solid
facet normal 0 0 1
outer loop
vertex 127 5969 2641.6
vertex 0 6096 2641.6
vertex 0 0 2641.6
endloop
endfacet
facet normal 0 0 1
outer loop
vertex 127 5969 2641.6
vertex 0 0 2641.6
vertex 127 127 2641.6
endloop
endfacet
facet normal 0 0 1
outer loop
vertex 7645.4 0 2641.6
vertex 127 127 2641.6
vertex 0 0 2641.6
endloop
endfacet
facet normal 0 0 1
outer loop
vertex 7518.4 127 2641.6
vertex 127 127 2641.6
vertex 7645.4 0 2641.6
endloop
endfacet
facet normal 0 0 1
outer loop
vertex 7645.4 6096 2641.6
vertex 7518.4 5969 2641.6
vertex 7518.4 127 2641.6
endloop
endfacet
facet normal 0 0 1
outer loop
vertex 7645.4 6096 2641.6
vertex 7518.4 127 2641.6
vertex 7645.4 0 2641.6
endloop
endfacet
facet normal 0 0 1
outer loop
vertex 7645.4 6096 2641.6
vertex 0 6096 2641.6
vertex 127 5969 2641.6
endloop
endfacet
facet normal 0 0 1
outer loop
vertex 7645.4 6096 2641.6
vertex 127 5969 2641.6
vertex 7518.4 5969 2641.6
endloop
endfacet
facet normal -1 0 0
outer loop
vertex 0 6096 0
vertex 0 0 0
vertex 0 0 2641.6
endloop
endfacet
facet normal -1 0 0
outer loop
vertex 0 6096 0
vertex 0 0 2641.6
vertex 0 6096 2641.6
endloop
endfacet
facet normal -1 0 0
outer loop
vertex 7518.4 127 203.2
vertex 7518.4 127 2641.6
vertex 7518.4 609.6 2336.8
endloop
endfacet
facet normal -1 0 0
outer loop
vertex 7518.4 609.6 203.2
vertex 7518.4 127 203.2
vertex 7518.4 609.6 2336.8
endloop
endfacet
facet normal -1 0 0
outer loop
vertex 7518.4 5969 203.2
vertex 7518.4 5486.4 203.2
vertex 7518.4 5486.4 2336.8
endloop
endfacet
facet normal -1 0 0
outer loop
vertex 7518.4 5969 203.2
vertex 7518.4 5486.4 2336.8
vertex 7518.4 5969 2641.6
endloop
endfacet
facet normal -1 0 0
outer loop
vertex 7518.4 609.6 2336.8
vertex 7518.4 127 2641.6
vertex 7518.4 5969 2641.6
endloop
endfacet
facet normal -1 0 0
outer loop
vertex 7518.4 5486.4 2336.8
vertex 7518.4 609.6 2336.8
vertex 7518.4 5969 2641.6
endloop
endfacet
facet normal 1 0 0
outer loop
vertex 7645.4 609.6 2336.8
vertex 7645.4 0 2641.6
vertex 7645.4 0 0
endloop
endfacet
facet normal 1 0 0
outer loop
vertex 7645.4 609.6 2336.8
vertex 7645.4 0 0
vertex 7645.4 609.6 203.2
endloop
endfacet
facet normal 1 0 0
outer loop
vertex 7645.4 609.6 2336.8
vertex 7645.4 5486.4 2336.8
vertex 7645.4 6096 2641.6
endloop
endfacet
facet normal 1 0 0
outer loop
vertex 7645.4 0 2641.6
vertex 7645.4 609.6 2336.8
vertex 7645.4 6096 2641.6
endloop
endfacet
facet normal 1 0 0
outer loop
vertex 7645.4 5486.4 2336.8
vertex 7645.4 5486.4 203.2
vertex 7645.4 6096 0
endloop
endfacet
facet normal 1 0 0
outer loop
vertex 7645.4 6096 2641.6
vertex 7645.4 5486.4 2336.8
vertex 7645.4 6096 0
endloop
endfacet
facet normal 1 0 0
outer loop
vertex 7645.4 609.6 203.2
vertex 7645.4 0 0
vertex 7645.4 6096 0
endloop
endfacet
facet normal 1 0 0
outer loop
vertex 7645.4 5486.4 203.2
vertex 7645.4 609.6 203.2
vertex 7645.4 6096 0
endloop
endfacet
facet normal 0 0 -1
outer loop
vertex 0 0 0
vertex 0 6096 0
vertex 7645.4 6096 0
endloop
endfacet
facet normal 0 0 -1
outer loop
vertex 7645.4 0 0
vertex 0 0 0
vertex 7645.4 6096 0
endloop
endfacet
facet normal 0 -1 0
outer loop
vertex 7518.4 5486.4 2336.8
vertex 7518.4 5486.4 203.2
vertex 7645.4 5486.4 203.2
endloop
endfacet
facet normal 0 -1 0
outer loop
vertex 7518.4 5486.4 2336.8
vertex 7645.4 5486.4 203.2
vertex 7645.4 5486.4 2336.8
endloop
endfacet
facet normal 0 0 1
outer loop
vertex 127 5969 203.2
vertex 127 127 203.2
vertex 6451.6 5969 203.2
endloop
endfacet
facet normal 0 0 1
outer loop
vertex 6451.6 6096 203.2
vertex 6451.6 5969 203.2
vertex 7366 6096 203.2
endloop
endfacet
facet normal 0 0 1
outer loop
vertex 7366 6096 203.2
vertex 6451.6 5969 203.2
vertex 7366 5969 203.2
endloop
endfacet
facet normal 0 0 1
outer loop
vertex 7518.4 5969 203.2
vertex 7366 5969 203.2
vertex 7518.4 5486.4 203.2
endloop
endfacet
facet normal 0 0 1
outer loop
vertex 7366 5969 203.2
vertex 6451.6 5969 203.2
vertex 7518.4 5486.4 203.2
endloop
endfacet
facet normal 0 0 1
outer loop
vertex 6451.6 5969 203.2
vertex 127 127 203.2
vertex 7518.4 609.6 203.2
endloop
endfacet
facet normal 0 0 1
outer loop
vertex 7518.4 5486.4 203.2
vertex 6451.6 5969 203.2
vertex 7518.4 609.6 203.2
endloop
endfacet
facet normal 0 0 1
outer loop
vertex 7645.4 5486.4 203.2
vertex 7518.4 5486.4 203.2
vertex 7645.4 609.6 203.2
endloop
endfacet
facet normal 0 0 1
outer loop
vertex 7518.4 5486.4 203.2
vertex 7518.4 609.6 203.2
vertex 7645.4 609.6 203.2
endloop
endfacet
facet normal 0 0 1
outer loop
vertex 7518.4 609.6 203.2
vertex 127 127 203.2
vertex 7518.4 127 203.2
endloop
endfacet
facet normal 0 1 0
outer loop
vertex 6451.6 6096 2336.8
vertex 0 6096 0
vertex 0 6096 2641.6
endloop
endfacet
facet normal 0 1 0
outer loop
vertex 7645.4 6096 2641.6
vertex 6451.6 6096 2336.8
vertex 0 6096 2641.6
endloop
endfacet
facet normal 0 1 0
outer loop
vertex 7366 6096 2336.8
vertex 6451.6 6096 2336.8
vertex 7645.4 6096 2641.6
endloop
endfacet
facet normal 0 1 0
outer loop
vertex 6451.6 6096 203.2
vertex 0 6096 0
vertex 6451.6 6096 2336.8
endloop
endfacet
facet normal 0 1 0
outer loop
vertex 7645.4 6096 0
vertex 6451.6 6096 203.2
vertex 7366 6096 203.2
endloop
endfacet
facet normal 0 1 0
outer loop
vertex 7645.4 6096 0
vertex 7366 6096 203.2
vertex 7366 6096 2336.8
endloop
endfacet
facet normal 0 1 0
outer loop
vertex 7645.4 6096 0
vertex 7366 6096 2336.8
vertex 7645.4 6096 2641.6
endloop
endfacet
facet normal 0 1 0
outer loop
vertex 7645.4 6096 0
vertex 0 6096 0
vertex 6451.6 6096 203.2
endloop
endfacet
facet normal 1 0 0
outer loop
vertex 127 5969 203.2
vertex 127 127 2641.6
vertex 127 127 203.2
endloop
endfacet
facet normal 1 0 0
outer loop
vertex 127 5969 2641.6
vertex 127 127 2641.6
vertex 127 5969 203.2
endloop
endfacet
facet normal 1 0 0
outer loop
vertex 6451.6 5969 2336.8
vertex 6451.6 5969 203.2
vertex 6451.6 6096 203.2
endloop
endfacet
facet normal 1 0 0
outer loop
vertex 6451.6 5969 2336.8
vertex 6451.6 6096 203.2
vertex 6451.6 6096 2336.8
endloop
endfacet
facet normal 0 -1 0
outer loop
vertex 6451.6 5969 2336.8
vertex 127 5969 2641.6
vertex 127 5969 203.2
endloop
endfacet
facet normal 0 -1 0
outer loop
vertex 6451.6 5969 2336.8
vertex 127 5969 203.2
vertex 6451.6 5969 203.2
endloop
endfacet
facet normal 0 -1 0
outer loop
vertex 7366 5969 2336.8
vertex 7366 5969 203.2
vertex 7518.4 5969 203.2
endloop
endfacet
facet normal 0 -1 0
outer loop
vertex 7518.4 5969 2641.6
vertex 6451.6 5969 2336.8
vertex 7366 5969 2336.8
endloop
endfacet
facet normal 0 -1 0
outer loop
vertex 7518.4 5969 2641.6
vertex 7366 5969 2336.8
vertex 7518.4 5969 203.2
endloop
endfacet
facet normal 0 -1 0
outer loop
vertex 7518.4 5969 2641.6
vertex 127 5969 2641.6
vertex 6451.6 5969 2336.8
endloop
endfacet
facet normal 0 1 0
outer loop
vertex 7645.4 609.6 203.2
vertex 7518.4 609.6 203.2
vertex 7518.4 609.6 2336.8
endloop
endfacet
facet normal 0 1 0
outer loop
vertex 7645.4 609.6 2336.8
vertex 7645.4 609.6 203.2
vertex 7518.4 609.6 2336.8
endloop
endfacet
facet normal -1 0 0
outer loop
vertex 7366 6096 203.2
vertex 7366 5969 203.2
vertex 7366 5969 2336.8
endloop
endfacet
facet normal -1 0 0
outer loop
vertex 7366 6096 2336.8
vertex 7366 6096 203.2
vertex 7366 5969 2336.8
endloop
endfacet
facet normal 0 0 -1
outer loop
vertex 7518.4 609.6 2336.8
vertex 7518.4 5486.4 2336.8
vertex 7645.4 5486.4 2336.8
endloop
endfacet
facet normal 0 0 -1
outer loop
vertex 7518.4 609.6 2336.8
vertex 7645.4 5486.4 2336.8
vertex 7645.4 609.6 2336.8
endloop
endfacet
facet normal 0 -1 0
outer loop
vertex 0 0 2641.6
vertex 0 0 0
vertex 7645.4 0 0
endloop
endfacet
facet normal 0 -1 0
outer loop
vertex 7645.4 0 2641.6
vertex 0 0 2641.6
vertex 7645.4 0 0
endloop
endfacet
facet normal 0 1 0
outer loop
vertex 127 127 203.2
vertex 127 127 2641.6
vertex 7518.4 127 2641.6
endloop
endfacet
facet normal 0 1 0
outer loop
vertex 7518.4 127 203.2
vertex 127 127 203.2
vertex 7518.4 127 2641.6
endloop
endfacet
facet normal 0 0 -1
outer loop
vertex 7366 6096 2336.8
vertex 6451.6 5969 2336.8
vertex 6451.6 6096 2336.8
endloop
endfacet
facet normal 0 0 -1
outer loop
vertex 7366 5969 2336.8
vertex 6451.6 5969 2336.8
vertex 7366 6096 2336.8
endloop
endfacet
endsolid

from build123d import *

# Parameters (mm, degrees)
F0_W     = 7645.4
F0_H     = 6096
F1_DEPTH = 2641.6
F2_W     = 7391.4
F2_H     = 5842
F3_DEPTH = 2438.4
F4_W     = 4876.8
F4_H     = 2133.6
F5_DEPTH = 127
F6_W     = 914.4
F6_H     = 2133.6
F7_DEPTH = 127


with BuildPart() as f1:
    # F0 (on Top) → F1 (new body)
    with BuildSketch(Plane.XY):
        with Locations((3822.7, 3048)):
            Rectangle(F0_W, F0_H)
    extrude(amount=F1_DEPTH)

    # F2 (on face) → F3 (cut)
    with BuildSketch(Plane.XY.offset(2641.6)):
        with Locations((3822.7, 3048)):
            Rectangle(F2_W, F2_H)
    extrude(amount=-F3_DEPTH, mode=Mode.SUBTRACT)

    # F4 (on face) → F5 (cut, through all)
    with BuildSketch(Plane(origin=(7518.4, 0, 0), x_dir=(0, -1, 0), z_dir=(-1, 0, 0))):
        with Locations((-3048, 1270)):
            Rectangle(F4_W, F4_H)
    extrude(amount=-F5_DEPTH, mode=Mode.SUBTRACT)

    # F6 (on face) → F7 (cut, through all)
    with BuildSketch(Plane.XZ.offset(-5969)):
        with Locations((6908.8, 1270)):
            Rectangle(F6_W, F6_H)
    extrude(amount=-F7_DEPTH, mode=Mode.SUBTRACT)


solid = f1.part
